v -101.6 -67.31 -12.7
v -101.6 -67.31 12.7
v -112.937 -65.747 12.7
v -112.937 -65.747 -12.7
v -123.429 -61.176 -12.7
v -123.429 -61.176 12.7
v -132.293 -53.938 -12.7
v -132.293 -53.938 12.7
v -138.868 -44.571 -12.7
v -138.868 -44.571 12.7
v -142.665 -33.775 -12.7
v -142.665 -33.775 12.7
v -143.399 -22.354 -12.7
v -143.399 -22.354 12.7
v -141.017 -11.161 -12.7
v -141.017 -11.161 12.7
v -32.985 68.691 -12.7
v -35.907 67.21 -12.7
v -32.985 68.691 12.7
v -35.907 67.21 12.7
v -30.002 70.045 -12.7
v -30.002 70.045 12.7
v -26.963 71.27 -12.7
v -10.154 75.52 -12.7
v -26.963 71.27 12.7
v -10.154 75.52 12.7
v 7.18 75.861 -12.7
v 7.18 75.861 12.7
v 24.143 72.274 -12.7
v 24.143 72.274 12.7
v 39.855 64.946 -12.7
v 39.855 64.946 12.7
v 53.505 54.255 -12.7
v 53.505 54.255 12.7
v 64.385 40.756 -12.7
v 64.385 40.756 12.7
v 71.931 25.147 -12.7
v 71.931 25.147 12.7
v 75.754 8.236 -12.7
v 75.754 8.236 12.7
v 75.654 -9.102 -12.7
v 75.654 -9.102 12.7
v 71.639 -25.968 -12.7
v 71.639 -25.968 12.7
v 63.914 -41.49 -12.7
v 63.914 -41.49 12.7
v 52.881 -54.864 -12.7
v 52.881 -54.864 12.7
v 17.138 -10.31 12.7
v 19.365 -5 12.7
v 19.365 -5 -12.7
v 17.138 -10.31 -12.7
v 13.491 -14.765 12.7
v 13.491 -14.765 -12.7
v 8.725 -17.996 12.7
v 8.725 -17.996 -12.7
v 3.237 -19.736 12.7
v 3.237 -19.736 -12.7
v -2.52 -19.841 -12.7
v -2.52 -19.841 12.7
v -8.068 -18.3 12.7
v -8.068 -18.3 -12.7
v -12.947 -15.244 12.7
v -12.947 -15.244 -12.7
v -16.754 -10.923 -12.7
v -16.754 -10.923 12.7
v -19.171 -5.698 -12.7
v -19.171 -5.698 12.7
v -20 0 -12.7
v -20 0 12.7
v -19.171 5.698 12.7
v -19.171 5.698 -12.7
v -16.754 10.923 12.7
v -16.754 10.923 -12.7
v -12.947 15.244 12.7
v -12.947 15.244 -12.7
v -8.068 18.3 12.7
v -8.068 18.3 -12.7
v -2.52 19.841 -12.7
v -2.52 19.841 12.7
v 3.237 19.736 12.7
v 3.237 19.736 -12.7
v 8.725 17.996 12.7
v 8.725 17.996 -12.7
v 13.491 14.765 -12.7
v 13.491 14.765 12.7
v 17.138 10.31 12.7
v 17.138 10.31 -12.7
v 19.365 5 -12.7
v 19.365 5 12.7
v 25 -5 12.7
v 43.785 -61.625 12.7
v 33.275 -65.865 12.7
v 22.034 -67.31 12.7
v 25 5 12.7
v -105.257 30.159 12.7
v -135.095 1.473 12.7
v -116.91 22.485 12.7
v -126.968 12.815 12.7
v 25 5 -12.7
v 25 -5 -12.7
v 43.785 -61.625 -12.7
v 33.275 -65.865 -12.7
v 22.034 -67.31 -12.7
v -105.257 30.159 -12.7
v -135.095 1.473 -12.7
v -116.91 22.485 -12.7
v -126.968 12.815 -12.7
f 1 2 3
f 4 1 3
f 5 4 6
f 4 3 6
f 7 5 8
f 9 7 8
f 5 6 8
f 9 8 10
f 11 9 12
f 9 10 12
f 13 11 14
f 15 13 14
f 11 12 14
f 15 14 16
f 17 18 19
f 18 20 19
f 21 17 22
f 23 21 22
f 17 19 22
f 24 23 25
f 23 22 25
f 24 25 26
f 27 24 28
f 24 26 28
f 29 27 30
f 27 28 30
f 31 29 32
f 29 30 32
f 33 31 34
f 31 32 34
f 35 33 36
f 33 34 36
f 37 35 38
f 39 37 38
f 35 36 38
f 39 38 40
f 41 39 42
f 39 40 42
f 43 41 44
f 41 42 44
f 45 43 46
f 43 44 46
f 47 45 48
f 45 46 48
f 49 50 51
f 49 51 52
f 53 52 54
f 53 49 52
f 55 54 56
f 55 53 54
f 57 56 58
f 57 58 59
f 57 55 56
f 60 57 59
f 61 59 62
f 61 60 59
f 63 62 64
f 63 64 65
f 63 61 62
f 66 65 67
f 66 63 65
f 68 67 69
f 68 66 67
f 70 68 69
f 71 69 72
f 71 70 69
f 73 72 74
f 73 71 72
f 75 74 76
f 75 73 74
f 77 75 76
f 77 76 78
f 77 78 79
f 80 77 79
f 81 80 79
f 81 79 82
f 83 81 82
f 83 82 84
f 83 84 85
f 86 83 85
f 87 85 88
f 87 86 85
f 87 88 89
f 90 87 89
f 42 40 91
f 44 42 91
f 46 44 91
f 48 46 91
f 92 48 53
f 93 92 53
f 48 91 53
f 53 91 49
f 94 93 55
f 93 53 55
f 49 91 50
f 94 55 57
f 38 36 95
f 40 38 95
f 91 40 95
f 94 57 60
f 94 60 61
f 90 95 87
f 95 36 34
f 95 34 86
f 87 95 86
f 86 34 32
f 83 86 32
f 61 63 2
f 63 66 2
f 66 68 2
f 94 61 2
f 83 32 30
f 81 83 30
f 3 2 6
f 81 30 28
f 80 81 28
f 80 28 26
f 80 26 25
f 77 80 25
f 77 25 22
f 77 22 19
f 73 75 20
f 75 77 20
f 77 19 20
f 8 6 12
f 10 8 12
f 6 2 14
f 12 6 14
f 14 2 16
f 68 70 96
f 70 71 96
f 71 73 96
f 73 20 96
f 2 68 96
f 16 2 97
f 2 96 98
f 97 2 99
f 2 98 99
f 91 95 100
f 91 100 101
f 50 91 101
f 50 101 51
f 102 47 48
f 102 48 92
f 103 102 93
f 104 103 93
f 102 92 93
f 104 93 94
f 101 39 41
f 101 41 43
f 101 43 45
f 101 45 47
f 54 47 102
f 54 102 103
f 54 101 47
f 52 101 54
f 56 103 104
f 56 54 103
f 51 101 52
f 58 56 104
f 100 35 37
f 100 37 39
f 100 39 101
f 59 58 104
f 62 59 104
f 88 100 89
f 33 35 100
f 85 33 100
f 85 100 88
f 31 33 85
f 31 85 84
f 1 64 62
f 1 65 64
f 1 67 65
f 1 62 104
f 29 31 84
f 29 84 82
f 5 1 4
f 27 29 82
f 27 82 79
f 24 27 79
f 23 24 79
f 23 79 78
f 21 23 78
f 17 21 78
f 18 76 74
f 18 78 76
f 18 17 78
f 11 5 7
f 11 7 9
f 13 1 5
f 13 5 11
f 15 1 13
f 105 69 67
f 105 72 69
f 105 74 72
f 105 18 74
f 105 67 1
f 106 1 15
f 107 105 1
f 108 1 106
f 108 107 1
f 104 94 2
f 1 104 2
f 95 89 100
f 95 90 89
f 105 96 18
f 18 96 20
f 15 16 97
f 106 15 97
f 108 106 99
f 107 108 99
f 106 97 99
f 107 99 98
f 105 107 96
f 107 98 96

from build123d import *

# Parameters (mm, degrees)
EXTRUDE1_DEPTH = 12.7


with BuildPart() as part:
    # Sketch1 → Extrude1 (new, symmetric)
    with BuildSketch(Plane.XY):
        with BuildLine():
            Line((-105.256684146, 30.159371772), (-35.906883315, 67.209640161))
            ThreePointArc((-35.906883315, 67.209640161), (-31.500545183, 69.384116721), (-26.963222432, 71.270082335))
            ThreePointArc((-26.963222432, 71.270082335), (64.384642533, 40.75607692), (52.880823594, -54.864))
            ThreePointArc((52.880823594, -54.864), (38.665343582, -64.081234212), (22.033676498, -67.31))
            Line((22.033676498, -67.31), (-101.6, -67.31))
            ThreePointArc((-101.6, -67.31), (-135.901703173, -49.47989326), (-141.016910096, -11.160783079))
            ThreePointArc((-141.016910096, -11.160783079), (-126.968198666, 12.815152805), (-105.256684146, 30.159371772))
        make_face()
        with BuildLine():
            Line((19.364916731, 5), (25, 5))
            Line((25, 5), (25, -5))
            Line((25, -5), (19.364916731, -5))
            ThreePointArc((19.364916731, -5), (-20, 0), (19.364916731, 5))
        make_face(mode=Mode.SUBTRACT)
    extrude(amount=EXTRUDE1_DEPTH, both=True)


solid = part.part
